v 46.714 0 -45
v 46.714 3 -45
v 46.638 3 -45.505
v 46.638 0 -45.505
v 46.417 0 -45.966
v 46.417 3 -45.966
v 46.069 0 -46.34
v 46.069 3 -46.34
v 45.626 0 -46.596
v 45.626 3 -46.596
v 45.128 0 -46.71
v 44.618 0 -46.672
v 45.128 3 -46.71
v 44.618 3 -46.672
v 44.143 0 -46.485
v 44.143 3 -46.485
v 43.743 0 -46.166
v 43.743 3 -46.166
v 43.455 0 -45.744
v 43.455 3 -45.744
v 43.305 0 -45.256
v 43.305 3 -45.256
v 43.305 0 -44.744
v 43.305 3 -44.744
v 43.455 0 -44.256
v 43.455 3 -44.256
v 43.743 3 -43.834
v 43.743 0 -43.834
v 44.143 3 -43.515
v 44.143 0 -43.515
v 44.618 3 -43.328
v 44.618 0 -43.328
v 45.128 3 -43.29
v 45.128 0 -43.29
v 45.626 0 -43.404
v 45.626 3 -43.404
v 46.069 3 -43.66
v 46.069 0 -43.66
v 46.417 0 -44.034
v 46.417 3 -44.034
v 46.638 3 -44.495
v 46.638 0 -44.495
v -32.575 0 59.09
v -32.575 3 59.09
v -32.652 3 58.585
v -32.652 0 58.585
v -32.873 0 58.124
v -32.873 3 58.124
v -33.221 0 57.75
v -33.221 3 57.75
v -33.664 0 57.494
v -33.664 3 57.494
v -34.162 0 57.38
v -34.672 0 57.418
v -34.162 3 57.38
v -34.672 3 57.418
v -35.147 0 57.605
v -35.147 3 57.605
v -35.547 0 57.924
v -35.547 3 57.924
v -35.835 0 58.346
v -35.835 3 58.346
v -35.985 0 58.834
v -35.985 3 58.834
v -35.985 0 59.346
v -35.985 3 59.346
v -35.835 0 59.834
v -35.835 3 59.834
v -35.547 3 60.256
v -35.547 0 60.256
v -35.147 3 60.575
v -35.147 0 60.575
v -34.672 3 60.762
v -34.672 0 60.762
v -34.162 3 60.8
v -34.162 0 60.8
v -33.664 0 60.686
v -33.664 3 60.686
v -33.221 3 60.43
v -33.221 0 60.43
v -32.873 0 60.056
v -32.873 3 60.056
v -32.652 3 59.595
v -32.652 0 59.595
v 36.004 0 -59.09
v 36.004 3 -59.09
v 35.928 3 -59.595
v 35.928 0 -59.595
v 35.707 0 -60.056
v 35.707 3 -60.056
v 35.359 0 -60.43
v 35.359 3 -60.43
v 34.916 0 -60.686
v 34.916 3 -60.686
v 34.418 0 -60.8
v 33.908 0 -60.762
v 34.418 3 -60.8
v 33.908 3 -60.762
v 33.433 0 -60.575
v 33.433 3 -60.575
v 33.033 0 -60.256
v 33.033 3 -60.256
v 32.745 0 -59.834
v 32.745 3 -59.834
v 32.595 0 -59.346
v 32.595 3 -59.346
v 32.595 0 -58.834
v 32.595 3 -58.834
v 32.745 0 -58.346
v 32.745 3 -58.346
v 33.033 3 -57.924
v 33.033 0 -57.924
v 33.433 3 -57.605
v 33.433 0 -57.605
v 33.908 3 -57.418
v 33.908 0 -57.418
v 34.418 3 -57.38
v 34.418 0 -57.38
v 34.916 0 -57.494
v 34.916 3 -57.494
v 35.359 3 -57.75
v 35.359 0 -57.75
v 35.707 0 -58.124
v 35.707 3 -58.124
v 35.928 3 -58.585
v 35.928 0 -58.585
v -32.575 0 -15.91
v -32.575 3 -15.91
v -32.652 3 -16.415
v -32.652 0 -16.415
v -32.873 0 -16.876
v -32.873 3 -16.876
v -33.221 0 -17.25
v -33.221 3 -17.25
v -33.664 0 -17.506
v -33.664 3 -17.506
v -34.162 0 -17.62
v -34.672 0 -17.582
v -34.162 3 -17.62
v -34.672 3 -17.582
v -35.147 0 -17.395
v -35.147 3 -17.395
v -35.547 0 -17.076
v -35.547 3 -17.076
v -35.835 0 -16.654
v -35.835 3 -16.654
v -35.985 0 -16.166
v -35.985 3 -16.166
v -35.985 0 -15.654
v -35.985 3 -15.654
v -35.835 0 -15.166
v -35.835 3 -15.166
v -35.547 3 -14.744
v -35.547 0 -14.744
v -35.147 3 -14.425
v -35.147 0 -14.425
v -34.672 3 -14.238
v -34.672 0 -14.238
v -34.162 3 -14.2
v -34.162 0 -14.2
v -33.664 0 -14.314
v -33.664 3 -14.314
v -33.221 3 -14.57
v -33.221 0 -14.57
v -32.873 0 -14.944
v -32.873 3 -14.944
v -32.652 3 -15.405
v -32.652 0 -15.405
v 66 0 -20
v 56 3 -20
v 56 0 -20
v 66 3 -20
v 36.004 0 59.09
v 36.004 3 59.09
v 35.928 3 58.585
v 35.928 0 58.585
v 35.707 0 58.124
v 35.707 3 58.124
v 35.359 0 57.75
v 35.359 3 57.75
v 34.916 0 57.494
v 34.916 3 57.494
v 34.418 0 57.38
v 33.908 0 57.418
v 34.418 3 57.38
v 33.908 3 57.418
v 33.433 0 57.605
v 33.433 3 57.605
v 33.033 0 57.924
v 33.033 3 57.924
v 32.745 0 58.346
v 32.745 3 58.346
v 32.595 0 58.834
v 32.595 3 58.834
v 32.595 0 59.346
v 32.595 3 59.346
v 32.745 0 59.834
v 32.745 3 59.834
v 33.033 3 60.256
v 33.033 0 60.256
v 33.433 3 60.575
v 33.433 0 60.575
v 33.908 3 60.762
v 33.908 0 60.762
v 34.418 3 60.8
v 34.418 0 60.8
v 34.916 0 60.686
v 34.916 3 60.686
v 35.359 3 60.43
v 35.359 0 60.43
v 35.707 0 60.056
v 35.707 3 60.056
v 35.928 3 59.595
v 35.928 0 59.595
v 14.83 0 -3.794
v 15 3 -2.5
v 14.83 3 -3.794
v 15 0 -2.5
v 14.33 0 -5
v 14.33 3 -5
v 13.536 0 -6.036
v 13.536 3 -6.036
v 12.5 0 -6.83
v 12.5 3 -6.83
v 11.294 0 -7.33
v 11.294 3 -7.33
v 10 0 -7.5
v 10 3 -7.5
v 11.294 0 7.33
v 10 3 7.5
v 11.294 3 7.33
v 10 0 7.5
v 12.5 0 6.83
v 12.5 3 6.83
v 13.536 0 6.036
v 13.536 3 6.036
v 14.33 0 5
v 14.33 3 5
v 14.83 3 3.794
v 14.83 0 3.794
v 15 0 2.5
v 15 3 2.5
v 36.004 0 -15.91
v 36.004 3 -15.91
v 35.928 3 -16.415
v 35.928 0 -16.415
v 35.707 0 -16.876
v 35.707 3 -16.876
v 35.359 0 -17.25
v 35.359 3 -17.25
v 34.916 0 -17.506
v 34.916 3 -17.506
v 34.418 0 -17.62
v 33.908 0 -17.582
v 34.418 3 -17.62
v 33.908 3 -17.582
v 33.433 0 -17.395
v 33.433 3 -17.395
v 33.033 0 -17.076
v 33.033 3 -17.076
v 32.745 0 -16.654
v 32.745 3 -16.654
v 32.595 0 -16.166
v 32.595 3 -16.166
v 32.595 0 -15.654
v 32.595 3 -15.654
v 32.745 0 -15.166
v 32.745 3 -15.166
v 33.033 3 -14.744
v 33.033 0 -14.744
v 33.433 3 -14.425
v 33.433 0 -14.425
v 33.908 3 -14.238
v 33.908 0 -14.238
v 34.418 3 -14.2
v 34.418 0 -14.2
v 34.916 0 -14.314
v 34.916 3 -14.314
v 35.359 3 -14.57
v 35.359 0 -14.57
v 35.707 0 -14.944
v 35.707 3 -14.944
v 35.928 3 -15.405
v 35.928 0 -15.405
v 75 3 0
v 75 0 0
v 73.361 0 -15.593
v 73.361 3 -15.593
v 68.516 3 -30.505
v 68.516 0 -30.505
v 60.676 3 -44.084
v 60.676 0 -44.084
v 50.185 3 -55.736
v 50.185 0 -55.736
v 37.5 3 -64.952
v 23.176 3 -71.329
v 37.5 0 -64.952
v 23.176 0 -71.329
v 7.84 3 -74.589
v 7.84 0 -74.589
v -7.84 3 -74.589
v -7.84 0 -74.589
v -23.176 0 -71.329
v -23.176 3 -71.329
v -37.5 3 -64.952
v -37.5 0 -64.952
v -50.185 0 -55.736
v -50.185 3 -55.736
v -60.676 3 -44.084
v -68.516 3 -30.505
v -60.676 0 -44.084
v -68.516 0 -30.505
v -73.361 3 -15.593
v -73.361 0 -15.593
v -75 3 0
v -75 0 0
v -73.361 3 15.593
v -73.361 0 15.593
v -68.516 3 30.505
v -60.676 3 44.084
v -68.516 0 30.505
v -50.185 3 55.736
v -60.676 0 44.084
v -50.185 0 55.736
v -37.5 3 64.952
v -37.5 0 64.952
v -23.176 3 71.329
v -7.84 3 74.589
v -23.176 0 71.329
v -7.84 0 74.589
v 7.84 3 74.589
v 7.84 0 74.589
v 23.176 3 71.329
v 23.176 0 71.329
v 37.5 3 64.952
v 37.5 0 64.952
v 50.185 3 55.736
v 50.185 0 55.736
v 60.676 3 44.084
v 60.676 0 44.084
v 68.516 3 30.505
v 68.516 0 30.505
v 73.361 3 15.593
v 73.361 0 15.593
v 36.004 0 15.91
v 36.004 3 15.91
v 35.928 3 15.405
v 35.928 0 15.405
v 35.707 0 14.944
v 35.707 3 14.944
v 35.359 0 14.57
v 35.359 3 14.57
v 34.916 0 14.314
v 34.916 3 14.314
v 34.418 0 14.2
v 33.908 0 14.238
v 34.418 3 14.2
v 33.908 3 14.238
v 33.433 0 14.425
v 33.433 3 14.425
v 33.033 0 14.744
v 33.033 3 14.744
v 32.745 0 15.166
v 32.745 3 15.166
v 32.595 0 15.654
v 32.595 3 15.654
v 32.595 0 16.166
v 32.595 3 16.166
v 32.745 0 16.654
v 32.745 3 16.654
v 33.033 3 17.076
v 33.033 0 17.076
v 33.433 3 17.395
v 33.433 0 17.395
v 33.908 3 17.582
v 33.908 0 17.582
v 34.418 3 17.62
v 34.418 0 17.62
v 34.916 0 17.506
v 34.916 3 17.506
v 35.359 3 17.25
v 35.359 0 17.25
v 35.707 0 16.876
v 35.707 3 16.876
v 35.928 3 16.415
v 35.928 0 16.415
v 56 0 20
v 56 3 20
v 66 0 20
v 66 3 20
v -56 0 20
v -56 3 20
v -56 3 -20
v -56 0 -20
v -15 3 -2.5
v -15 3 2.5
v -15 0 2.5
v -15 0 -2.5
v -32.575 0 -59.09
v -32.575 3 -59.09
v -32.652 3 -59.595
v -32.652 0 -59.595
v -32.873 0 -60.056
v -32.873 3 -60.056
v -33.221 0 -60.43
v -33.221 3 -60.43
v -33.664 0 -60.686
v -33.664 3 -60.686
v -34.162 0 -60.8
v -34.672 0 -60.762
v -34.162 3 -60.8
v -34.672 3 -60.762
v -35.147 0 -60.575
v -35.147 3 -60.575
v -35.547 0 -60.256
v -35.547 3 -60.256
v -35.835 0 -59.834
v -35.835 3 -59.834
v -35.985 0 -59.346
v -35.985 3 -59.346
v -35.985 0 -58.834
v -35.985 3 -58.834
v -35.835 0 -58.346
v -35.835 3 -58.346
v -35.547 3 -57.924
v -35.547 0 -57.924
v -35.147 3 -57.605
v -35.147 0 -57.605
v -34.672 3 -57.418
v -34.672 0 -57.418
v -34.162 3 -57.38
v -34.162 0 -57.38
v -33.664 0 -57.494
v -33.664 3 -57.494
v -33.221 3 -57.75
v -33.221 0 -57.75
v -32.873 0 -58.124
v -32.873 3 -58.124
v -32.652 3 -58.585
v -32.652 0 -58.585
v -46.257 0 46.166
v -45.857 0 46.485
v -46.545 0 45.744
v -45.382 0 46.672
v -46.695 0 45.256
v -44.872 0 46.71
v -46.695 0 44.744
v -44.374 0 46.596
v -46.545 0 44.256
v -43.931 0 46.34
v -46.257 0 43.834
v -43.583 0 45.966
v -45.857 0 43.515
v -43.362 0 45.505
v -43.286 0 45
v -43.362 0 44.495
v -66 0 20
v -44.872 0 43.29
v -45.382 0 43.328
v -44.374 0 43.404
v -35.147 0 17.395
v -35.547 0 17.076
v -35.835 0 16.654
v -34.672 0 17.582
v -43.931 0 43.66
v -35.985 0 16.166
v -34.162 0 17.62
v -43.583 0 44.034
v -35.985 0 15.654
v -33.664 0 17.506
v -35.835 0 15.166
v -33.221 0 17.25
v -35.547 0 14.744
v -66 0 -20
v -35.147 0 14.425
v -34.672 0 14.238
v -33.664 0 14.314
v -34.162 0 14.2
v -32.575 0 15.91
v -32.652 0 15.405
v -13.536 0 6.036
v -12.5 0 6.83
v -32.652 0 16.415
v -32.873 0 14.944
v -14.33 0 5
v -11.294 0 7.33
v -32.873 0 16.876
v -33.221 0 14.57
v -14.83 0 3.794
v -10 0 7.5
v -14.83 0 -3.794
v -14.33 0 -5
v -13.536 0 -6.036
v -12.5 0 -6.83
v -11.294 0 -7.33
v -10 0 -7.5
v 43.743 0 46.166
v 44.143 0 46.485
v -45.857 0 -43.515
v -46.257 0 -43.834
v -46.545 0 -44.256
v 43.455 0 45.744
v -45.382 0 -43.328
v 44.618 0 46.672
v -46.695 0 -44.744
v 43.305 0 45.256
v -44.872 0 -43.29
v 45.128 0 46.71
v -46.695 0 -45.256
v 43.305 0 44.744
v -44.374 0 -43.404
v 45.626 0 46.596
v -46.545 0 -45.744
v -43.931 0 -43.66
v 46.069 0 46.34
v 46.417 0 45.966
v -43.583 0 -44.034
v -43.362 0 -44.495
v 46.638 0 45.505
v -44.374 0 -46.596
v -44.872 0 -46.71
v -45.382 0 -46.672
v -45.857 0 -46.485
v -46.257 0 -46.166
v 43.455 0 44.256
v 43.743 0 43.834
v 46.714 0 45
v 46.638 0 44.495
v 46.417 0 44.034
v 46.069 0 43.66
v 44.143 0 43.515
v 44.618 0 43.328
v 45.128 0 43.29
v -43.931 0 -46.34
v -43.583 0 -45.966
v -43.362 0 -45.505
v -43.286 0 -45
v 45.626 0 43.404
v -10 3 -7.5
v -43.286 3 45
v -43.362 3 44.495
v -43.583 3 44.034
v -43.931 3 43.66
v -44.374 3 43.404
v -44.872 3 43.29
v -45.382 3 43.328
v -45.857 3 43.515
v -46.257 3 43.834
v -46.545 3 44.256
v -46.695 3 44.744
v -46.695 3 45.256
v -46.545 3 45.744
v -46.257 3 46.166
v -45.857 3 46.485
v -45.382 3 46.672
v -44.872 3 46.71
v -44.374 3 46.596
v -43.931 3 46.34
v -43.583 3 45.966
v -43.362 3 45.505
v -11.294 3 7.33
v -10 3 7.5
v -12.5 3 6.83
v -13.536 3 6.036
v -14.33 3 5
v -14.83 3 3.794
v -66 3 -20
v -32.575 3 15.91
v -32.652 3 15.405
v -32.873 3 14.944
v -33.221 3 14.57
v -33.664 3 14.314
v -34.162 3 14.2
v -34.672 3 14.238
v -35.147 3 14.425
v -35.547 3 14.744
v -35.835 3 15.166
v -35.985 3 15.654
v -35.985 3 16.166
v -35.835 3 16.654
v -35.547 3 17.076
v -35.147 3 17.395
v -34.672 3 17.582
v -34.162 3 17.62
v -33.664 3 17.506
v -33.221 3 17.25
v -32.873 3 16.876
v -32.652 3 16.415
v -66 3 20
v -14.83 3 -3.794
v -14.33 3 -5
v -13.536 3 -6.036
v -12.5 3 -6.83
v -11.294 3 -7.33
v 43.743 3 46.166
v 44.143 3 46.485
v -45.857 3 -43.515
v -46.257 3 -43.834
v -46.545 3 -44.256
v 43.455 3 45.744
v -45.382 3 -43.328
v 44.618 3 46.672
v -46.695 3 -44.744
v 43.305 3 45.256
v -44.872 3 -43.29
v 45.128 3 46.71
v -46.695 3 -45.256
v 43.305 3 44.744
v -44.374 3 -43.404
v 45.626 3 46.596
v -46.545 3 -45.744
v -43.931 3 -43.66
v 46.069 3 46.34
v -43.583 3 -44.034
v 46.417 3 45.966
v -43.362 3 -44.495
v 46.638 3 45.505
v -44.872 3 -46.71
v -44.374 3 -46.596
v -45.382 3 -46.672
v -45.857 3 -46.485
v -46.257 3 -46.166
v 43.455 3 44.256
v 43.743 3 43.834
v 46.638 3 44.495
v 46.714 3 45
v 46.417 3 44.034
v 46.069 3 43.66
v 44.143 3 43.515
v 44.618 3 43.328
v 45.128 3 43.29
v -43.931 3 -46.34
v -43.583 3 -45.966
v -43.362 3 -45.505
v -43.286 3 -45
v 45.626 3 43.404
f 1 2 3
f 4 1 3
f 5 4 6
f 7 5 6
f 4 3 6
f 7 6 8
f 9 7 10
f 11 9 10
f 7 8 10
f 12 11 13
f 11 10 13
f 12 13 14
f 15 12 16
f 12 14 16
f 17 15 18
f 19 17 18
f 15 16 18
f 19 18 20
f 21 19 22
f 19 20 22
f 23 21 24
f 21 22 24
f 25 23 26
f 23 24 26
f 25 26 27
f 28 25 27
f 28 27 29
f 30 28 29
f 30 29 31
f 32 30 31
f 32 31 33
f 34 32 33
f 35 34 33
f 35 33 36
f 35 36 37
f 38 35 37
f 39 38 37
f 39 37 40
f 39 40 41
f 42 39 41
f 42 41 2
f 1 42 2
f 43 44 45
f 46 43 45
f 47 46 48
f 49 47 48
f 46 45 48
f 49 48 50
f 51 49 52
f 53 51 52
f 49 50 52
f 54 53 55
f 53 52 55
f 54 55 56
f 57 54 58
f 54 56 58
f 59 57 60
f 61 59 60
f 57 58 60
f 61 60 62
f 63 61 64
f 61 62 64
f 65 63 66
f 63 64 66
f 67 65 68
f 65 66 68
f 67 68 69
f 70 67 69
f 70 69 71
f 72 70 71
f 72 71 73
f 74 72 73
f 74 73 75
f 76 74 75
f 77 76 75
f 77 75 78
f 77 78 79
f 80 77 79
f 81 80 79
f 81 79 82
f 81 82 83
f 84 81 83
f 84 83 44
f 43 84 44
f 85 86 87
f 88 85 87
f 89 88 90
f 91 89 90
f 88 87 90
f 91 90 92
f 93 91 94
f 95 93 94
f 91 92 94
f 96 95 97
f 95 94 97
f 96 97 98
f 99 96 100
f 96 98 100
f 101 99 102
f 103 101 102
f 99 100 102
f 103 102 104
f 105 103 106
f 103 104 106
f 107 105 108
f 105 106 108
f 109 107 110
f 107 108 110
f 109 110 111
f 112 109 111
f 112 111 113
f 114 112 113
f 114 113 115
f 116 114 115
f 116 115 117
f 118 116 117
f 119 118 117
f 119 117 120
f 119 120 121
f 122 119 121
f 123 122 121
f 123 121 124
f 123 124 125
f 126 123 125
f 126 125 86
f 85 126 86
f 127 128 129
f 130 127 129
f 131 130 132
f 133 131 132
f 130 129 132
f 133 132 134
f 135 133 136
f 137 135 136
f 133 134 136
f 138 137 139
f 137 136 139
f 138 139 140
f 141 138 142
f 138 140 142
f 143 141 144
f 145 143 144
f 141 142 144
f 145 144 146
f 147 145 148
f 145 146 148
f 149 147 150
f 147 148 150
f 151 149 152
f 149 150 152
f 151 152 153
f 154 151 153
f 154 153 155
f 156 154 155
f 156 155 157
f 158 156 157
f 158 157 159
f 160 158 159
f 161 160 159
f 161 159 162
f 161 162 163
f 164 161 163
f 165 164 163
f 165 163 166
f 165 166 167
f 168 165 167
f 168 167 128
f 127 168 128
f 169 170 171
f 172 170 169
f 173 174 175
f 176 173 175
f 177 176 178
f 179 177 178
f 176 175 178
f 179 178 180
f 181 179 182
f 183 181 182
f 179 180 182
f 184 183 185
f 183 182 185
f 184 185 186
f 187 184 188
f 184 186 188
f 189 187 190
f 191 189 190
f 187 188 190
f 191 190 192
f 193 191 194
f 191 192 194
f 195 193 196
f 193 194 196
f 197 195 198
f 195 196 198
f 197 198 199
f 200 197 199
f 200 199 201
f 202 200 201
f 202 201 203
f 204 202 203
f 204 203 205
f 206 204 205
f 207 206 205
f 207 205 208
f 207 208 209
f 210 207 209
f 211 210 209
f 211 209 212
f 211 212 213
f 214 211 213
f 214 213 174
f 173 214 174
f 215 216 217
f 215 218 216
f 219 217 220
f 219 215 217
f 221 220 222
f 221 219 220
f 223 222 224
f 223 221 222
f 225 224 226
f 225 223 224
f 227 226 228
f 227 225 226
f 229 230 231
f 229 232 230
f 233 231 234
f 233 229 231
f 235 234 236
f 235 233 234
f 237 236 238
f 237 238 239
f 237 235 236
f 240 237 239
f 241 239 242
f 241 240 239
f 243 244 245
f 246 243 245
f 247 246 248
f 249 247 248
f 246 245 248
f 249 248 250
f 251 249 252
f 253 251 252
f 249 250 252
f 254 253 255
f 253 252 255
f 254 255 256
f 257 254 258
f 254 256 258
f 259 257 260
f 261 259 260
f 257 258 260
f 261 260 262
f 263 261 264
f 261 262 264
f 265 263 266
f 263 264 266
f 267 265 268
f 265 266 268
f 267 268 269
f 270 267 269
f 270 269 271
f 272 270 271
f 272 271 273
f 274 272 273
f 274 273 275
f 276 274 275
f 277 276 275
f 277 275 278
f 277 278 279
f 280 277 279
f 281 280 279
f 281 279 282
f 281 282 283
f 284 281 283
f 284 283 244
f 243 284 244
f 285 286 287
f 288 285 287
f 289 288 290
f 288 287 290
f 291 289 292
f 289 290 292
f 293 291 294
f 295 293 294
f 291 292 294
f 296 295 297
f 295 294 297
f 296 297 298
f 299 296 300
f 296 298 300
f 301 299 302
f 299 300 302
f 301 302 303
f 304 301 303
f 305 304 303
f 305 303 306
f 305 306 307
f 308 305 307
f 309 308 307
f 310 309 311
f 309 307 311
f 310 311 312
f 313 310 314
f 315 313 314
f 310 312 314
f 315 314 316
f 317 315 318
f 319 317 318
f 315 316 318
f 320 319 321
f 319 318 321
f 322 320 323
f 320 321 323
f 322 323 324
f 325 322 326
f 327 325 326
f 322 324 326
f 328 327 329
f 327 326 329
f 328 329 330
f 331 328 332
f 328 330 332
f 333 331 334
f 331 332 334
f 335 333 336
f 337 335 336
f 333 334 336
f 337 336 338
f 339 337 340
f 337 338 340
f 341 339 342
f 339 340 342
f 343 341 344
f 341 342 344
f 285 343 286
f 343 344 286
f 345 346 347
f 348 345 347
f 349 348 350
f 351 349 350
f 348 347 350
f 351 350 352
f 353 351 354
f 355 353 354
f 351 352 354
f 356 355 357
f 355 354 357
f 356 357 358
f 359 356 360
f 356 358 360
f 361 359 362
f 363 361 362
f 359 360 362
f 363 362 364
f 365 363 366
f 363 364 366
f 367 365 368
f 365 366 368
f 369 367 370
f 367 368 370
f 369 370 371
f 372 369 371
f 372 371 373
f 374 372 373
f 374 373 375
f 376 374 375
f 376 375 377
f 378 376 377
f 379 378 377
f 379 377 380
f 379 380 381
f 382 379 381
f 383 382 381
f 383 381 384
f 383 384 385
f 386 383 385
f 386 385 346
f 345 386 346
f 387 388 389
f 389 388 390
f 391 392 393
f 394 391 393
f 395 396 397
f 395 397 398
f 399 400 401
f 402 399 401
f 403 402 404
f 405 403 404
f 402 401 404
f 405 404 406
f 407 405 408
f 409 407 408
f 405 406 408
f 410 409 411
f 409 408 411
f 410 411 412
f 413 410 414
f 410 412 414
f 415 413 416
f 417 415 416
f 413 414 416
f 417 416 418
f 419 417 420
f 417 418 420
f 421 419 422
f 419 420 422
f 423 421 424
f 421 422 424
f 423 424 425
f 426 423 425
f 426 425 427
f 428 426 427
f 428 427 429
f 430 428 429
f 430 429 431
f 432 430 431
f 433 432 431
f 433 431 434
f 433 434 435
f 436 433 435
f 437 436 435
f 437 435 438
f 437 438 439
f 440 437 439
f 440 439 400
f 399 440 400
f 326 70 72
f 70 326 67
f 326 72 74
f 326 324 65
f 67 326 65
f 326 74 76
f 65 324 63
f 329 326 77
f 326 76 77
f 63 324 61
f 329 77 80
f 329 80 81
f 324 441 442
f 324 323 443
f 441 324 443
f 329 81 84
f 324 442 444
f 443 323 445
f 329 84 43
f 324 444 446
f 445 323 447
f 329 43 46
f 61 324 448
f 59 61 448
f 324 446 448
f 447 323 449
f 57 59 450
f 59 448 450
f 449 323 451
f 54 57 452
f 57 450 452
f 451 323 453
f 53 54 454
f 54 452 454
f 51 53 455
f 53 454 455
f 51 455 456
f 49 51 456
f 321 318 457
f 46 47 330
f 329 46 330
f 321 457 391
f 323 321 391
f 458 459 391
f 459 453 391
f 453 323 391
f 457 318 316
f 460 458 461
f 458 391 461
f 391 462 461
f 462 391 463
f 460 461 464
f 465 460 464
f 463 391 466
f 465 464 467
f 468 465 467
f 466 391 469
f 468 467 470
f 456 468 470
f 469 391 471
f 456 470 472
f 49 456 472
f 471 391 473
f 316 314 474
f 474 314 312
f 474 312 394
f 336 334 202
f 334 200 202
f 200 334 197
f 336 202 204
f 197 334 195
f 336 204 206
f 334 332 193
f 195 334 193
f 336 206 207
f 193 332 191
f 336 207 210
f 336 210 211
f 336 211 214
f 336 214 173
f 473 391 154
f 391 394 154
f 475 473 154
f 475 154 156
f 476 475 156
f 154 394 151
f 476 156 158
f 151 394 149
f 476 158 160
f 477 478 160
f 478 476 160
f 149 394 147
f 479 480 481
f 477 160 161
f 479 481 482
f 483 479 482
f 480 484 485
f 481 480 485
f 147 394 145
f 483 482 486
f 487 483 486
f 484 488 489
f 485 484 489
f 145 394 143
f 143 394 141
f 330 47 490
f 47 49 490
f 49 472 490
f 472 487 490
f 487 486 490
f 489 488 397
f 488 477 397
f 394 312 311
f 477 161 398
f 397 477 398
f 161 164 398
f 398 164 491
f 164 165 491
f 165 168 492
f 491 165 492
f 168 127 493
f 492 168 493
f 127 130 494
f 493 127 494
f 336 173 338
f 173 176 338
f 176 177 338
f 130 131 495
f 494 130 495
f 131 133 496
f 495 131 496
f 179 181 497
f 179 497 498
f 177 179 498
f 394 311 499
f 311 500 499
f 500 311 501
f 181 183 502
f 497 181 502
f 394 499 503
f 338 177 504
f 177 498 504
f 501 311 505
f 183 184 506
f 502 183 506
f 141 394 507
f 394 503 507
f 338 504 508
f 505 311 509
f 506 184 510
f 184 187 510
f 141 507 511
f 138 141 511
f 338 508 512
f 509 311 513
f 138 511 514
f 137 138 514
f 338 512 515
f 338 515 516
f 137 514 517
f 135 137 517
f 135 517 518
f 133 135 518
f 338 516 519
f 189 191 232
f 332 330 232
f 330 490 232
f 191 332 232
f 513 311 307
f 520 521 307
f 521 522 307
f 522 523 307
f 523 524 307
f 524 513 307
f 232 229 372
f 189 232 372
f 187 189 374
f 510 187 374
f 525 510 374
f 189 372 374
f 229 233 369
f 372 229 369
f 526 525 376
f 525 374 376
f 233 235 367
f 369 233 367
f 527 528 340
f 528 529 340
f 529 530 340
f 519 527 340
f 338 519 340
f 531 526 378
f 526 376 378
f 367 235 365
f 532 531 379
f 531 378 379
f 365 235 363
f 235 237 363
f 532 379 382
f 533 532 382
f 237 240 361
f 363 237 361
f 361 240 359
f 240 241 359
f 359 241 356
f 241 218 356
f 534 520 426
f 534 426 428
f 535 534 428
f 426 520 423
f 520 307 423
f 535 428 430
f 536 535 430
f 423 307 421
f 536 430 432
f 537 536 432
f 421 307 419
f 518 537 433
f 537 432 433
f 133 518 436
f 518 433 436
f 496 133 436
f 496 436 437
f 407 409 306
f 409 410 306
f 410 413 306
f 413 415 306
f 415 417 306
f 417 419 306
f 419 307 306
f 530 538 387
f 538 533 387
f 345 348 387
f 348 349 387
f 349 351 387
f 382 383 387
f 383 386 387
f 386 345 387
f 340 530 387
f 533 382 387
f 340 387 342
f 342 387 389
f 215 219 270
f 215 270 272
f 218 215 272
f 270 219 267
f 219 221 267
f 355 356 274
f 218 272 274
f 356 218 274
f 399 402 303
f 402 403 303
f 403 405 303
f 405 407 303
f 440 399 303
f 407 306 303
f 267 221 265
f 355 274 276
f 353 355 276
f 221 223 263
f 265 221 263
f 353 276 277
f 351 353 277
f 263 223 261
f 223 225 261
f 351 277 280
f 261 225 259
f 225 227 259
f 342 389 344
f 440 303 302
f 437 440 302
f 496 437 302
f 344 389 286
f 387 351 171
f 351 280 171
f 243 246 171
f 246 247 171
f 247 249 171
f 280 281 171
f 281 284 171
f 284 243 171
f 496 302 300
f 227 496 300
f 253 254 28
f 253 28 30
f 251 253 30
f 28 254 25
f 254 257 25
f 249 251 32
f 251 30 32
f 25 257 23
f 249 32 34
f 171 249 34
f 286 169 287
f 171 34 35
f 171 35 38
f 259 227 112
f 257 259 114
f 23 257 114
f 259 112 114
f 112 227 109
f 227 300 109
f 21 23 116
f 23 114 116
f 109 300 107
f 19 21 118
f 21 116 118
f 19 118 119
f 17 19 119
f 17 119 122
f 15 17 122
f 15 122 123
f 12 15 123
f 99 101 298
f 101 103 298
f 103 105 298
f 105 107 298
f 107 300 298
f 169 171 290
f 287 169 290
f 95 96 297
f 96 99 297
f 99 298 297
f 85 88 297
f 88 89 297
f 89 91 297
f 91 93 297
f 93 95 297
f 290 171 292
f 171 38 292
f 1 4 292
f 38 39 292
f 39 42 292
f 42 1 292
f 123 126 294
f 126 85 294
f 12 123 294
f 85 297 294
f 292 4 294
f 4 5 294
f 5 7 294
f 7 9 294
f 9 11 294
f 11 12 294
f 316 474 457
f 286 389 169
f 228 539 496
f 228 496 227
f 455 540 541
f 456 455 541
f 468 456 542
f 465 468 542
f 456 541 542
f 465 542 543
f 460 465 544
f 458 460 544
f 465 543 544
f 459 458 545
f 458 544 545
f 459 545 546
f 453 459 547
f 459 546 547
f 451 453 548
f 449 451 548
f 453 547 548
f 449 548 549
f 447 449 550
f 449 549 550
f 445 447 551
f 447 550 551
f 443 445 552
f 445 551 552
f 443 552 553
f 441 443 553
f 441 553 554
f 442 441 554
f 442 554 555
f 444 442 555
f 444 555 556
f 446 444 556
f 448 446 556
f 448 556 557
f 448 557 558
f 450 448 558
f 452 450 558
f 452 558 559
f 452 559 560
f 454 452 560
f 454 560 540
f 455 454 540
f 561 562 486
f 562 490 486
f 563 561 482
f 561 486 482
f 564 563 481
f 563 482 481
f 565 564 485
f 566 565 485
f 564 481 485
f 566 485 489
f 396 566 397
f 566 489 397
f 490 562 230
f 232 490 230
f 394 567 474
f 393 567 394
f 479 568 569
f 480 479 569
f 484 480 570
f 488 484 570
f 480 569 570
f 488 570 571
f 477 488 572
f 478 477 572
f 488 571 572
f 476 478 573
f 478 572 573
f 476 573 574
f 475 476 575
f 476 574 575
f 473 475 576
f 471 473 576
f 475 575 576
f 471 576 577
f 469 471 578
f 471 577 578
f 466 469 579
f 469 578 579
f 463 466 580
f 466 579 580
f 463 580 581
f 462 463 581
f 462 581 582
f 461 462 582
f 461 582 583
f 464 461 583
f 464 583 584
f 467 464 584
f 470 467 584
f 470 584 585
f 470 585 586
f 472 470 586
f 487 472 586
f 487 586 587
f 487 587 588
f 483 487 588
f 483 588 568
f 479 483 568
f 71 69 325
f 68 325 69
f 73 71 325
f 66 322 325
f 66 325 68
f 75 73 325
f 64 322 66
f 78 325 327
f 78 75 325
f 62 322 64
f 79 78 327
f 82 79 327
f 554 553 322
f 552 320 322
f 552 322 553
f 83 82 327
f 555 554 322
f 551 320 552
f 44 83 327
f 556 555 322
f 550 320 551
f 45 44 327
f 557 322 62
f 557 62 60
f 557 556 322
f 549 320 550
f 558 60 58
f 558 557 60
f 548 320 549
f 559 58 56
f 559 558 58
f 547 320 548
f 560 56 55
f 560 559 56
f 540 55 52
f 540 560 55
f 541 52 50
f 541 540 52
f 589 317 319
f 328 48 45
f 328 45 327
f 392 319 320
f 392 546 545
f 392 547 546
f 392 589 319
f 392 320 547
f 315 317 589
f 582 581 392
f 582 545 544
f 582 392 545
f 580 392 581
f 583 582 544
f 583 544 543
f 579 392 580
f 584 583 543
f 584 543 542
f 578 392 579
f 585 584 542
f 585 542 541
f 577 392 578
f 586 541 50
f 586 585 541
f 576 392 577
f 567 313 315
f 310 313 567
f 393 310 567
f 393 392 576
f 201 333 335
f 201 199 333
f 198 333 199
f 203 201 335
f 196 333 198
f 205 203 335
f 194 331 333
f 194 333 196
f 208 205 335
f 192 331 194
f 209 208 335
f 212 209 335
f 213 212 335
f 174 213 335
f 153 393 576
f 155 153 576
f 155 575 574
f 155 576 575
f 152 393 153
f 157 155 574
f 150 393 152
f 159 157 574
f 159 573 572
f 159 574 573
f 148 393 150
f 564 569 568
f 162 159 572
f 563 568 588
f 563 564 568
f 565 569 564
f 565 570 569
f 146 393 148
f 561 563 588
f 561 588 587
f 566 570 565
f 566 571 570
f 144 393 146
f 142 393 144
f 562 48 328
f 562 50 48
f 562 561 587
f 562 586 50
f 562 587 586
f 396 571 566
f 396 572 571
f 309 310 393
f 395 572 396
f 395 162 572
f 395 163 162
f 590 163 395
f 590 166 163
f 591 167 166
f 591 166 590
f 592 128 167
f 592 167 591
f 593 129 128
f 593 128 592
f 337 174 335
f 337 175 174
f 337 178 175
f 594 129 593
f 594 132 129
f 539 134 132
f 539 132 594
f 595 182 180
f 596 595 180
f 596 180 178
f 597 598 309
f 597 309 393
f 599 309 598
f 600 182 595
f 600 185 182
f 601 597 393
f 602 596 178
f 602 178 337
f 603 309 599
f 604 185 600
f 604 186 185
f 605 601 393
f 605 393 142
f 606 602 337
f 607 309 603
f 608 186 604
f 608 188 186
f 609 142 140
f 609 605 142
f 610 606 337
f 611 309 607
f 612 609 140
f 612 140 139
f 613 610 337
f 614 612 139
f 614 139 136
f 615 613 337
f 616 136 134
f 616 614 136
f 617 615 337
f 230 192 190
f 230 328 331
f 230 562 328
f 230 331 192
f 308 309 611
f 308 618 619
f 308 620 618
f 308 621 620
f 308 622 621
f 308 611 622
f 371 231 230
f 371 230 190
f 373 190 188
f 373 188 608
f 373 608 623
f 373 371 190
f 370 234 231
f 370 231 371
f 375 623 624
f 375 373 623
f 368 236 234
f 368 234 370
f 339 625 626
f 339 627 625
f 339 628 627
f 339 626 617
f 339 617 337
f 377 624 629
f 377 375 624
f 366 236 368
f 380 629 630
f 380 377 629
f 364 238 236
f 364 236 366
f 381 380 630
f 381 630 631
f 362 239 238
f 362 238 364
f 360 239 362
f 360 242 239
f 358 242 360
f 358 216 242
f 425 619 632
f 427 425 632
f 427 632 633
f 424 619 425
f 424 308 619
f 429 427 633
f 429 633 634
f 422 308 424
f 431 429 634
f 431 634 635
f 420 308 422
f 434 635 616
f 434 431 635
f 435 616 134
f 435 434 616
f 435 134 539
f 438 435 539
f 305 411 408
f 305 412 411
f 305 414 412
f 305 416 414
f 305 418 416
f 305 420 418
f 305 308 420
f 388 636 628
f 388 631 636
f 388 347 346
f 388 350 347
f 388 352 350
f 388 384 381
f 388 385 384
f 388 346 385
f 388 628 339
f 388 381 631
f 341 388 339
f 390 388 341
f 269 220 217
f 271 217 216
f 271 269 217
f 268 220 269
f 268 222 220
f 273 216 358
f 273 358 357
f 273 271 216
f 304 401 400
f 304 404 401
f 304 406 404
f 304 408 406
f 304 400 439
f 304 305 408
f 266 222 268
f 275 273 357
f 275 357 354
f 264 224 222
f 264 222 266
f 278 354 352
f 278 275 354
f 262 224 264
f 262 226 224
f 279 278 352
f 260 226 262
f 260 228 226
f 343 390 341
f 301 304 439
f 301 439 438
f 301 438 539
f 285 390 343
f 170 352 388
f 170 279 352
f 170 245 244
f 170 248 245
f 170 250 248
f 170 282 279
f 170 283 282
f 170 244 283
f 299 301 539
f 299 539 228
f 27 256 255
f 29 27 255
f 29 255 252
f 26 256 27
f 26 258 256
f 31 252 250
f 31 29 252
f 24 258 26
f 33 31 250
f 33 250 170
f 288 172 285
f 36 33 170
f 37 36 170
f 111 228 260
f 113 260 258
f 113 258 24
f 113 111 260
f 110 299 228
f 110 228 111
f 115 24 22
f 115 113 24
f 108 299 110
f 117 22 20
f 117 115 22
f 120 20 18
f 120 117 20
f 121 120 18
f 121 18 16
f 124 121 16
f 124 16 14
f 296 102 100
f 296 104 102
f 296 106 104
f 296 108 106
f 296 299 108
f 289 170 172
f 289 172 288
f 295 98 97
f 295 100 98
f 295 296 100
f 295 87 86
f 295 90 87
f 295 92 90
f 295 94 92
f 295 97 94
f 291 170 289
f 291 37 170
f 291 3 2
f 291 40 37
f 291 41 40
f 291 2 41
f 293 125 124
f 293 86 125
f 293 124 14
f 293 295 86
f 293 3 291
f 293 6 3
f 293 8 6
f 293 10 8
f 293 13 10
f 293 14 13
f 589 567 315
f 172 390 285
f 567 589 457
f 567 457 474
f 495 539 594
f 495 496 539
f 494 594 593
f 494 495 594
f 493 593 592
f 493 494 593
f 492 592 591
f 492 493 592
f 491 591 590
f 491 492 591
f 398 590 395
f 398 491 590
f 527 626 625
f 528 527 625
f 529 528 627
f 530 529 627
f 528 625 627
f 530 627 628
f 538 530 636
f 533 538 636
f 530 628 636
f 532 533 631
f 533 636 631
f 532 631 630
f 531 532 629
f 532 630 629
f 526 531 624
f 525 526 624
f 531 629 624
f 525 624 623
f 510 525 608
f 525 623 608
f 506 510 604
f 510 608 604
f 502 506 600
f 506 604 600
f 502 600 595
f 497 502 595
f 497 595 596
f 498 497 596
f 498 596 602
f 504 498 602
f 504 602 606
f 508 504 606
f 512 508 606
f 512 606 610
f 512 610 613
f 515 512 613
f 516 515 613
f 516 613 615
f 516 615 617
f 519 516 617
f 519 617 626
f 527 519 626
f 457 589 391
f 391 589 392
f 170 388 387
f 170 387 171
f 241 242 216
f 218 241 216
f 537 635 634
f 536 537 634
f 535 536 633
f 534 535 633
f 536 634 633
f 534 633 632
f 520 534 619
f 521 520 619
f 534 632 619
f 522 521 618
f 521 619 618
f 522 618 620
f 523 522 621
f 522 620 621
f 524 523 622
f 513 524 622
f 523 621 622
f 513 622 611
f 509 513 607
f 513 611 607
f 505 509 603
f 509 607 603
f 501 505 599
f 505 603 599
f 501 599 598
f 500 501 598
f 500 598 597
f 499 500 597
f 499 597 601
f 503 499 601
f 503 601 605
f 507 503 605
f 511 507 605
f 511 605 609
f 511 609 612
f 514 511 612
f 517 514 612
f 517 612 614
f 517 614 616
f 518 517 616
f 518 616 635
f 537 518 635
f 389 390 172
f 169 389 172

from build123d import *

# Parameters (mm, degrees)
SKETCH1_R           = 75
BOSS_EXTRUDE1_DEPTH = 3
SKETCH2_W           = 10
SKETCH2_H           = 40
CUT_EXTRUDE1_DEPTH  = 6.35
SKETCH8_R           = 1.7145
CUT_EXTRUDE7_DEPTH  = 4
SKETCH9_W           = 30
SKETCH9_H           = 15
CUT_EXTRUDE8_DEPTH  = 4
FILLET1_R           = 5
SKETCH10_R          = 1.7145
CUT_EXTRUDE9_DEPTH  = 10


with BuildPart() as part:
    # Sketch1 → Boss-Extrude1 (new body)
    with BuildSketch(Plane(origin=(0, 0, 0), x_dir=(1, 0, 0), z_dir=(0, 1, 0))):
        Circle(SKETCH1_R)
    extrude(amount=BOSS_EXTRUDE1_DEPTH)

    # Sketch2 → Cut-Extrude1 (cut)
    with BuildSketch(Plane(origin=(0, 3, 0), x_dir=(1, 0, 0), z_dir=(0, 1, 0))):
        with Locations((-61, 0)):
            Rectangle(SKETCH2_W, SKETCH2_H)
        with Locations((61, 0)):
            Rectangle(SKETCH2_W, SKETCH2_H)
    extrude(amount=-CUT_EXTRUDE1_DEPTH, mode=Mode.SUBTRACT)

    # Sketch8 → Cut-Extrude7 (cut, through all)
    with BuildSketch(Plane(origin=(0, 3, 0), x_dir=(1, 0, 0), z_dir=(0, 1, 0))):
        with Locations((-45, 45)):
            Circle(SKETCH8_R)
        with Locations((45, 45)):
            Circle(SKETCH8_R)
        with Locations((45, -45)):
            Circle(SKETCH8_R)
        with Locations((-45, -45)):
            Circle(SKETCH8_R)
    extrude(amount=-CUT_EXTRUDE7_DEPTH, mode=Mode.SUBTRACT)

    # Sketch9 → Cut-Extrude8 (cut, through all)
    with BuildSketch(Plane(origin=(0, 3, 0), x_dir=(1, 0, 0), z_dir=(0, 1, 0))):
        Rectangle(SKETCH9_W, SKETCH9_H)
    extrude(amount=-CUT_EXTRUDE8_DEPTH, mode=Mode.SUBTRACT)

    # Fillet1
    fillet1_edges = [part.edges().sort_by_distance(p)[0] for p in [
        (15, 1.5, -7.5),
        (15, 1.5, 7.5),
        (-15, 1.5, 7.5),
        (-15, 1.5, -7.5),
    ]]
    fillet(fillet1_edges, radius=FILLET1_R)

    # Sketch10 → Cut-Extrude9 (cut)
    with BuildSketch(Plane(origin=(0, 3, 0), x_dir=(1, 0, 0), z_dir=(0, 1, 0))):
        with Locations((34.29, 59.09)):
            Circle(SKETCH10_R)
        with Locations((34.29, 15.91)):
            Circle(SKETCH10_R)
        with Locations((-34.29, 15.91)):
            Circle(SKETCH10_R)
        with Locations((-34.29, 59.09)):
            Circle(SKETCH10_R)
        with Locations((-34.29, -15.91)):
            Circle(SKETCH10_R)
        with Locations((-34.29, -59.09)):
            Circle(SKETCH10_R)
        with Locations((34.29, -59.09)):
            Circle(SKETCH10_R)
        with Locations((34.29, -15.91)):
            Circle(SKETCH10_R)
    extrude(amount=-CUT_EXTRUDE9_DEPTH, mode=Mode.SUBTRACT)


solid = part.part
